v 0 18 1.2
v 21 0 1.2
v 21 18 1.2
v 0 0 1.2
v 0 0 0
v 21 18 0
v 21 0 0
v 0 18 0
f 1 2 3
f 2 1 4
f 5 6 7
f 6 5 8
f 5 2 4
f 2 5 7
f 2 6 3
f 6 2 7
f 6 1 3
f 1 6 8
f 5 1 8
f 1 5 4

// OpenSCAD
$fn = 64;

pcb_x = 21.0;
pcb_y = 18.0;
pcb_th = 1.2;

color([0.05, 0.45, 0.18])
cube([pcb_x, pcb_y, pcb_th], center=false);
